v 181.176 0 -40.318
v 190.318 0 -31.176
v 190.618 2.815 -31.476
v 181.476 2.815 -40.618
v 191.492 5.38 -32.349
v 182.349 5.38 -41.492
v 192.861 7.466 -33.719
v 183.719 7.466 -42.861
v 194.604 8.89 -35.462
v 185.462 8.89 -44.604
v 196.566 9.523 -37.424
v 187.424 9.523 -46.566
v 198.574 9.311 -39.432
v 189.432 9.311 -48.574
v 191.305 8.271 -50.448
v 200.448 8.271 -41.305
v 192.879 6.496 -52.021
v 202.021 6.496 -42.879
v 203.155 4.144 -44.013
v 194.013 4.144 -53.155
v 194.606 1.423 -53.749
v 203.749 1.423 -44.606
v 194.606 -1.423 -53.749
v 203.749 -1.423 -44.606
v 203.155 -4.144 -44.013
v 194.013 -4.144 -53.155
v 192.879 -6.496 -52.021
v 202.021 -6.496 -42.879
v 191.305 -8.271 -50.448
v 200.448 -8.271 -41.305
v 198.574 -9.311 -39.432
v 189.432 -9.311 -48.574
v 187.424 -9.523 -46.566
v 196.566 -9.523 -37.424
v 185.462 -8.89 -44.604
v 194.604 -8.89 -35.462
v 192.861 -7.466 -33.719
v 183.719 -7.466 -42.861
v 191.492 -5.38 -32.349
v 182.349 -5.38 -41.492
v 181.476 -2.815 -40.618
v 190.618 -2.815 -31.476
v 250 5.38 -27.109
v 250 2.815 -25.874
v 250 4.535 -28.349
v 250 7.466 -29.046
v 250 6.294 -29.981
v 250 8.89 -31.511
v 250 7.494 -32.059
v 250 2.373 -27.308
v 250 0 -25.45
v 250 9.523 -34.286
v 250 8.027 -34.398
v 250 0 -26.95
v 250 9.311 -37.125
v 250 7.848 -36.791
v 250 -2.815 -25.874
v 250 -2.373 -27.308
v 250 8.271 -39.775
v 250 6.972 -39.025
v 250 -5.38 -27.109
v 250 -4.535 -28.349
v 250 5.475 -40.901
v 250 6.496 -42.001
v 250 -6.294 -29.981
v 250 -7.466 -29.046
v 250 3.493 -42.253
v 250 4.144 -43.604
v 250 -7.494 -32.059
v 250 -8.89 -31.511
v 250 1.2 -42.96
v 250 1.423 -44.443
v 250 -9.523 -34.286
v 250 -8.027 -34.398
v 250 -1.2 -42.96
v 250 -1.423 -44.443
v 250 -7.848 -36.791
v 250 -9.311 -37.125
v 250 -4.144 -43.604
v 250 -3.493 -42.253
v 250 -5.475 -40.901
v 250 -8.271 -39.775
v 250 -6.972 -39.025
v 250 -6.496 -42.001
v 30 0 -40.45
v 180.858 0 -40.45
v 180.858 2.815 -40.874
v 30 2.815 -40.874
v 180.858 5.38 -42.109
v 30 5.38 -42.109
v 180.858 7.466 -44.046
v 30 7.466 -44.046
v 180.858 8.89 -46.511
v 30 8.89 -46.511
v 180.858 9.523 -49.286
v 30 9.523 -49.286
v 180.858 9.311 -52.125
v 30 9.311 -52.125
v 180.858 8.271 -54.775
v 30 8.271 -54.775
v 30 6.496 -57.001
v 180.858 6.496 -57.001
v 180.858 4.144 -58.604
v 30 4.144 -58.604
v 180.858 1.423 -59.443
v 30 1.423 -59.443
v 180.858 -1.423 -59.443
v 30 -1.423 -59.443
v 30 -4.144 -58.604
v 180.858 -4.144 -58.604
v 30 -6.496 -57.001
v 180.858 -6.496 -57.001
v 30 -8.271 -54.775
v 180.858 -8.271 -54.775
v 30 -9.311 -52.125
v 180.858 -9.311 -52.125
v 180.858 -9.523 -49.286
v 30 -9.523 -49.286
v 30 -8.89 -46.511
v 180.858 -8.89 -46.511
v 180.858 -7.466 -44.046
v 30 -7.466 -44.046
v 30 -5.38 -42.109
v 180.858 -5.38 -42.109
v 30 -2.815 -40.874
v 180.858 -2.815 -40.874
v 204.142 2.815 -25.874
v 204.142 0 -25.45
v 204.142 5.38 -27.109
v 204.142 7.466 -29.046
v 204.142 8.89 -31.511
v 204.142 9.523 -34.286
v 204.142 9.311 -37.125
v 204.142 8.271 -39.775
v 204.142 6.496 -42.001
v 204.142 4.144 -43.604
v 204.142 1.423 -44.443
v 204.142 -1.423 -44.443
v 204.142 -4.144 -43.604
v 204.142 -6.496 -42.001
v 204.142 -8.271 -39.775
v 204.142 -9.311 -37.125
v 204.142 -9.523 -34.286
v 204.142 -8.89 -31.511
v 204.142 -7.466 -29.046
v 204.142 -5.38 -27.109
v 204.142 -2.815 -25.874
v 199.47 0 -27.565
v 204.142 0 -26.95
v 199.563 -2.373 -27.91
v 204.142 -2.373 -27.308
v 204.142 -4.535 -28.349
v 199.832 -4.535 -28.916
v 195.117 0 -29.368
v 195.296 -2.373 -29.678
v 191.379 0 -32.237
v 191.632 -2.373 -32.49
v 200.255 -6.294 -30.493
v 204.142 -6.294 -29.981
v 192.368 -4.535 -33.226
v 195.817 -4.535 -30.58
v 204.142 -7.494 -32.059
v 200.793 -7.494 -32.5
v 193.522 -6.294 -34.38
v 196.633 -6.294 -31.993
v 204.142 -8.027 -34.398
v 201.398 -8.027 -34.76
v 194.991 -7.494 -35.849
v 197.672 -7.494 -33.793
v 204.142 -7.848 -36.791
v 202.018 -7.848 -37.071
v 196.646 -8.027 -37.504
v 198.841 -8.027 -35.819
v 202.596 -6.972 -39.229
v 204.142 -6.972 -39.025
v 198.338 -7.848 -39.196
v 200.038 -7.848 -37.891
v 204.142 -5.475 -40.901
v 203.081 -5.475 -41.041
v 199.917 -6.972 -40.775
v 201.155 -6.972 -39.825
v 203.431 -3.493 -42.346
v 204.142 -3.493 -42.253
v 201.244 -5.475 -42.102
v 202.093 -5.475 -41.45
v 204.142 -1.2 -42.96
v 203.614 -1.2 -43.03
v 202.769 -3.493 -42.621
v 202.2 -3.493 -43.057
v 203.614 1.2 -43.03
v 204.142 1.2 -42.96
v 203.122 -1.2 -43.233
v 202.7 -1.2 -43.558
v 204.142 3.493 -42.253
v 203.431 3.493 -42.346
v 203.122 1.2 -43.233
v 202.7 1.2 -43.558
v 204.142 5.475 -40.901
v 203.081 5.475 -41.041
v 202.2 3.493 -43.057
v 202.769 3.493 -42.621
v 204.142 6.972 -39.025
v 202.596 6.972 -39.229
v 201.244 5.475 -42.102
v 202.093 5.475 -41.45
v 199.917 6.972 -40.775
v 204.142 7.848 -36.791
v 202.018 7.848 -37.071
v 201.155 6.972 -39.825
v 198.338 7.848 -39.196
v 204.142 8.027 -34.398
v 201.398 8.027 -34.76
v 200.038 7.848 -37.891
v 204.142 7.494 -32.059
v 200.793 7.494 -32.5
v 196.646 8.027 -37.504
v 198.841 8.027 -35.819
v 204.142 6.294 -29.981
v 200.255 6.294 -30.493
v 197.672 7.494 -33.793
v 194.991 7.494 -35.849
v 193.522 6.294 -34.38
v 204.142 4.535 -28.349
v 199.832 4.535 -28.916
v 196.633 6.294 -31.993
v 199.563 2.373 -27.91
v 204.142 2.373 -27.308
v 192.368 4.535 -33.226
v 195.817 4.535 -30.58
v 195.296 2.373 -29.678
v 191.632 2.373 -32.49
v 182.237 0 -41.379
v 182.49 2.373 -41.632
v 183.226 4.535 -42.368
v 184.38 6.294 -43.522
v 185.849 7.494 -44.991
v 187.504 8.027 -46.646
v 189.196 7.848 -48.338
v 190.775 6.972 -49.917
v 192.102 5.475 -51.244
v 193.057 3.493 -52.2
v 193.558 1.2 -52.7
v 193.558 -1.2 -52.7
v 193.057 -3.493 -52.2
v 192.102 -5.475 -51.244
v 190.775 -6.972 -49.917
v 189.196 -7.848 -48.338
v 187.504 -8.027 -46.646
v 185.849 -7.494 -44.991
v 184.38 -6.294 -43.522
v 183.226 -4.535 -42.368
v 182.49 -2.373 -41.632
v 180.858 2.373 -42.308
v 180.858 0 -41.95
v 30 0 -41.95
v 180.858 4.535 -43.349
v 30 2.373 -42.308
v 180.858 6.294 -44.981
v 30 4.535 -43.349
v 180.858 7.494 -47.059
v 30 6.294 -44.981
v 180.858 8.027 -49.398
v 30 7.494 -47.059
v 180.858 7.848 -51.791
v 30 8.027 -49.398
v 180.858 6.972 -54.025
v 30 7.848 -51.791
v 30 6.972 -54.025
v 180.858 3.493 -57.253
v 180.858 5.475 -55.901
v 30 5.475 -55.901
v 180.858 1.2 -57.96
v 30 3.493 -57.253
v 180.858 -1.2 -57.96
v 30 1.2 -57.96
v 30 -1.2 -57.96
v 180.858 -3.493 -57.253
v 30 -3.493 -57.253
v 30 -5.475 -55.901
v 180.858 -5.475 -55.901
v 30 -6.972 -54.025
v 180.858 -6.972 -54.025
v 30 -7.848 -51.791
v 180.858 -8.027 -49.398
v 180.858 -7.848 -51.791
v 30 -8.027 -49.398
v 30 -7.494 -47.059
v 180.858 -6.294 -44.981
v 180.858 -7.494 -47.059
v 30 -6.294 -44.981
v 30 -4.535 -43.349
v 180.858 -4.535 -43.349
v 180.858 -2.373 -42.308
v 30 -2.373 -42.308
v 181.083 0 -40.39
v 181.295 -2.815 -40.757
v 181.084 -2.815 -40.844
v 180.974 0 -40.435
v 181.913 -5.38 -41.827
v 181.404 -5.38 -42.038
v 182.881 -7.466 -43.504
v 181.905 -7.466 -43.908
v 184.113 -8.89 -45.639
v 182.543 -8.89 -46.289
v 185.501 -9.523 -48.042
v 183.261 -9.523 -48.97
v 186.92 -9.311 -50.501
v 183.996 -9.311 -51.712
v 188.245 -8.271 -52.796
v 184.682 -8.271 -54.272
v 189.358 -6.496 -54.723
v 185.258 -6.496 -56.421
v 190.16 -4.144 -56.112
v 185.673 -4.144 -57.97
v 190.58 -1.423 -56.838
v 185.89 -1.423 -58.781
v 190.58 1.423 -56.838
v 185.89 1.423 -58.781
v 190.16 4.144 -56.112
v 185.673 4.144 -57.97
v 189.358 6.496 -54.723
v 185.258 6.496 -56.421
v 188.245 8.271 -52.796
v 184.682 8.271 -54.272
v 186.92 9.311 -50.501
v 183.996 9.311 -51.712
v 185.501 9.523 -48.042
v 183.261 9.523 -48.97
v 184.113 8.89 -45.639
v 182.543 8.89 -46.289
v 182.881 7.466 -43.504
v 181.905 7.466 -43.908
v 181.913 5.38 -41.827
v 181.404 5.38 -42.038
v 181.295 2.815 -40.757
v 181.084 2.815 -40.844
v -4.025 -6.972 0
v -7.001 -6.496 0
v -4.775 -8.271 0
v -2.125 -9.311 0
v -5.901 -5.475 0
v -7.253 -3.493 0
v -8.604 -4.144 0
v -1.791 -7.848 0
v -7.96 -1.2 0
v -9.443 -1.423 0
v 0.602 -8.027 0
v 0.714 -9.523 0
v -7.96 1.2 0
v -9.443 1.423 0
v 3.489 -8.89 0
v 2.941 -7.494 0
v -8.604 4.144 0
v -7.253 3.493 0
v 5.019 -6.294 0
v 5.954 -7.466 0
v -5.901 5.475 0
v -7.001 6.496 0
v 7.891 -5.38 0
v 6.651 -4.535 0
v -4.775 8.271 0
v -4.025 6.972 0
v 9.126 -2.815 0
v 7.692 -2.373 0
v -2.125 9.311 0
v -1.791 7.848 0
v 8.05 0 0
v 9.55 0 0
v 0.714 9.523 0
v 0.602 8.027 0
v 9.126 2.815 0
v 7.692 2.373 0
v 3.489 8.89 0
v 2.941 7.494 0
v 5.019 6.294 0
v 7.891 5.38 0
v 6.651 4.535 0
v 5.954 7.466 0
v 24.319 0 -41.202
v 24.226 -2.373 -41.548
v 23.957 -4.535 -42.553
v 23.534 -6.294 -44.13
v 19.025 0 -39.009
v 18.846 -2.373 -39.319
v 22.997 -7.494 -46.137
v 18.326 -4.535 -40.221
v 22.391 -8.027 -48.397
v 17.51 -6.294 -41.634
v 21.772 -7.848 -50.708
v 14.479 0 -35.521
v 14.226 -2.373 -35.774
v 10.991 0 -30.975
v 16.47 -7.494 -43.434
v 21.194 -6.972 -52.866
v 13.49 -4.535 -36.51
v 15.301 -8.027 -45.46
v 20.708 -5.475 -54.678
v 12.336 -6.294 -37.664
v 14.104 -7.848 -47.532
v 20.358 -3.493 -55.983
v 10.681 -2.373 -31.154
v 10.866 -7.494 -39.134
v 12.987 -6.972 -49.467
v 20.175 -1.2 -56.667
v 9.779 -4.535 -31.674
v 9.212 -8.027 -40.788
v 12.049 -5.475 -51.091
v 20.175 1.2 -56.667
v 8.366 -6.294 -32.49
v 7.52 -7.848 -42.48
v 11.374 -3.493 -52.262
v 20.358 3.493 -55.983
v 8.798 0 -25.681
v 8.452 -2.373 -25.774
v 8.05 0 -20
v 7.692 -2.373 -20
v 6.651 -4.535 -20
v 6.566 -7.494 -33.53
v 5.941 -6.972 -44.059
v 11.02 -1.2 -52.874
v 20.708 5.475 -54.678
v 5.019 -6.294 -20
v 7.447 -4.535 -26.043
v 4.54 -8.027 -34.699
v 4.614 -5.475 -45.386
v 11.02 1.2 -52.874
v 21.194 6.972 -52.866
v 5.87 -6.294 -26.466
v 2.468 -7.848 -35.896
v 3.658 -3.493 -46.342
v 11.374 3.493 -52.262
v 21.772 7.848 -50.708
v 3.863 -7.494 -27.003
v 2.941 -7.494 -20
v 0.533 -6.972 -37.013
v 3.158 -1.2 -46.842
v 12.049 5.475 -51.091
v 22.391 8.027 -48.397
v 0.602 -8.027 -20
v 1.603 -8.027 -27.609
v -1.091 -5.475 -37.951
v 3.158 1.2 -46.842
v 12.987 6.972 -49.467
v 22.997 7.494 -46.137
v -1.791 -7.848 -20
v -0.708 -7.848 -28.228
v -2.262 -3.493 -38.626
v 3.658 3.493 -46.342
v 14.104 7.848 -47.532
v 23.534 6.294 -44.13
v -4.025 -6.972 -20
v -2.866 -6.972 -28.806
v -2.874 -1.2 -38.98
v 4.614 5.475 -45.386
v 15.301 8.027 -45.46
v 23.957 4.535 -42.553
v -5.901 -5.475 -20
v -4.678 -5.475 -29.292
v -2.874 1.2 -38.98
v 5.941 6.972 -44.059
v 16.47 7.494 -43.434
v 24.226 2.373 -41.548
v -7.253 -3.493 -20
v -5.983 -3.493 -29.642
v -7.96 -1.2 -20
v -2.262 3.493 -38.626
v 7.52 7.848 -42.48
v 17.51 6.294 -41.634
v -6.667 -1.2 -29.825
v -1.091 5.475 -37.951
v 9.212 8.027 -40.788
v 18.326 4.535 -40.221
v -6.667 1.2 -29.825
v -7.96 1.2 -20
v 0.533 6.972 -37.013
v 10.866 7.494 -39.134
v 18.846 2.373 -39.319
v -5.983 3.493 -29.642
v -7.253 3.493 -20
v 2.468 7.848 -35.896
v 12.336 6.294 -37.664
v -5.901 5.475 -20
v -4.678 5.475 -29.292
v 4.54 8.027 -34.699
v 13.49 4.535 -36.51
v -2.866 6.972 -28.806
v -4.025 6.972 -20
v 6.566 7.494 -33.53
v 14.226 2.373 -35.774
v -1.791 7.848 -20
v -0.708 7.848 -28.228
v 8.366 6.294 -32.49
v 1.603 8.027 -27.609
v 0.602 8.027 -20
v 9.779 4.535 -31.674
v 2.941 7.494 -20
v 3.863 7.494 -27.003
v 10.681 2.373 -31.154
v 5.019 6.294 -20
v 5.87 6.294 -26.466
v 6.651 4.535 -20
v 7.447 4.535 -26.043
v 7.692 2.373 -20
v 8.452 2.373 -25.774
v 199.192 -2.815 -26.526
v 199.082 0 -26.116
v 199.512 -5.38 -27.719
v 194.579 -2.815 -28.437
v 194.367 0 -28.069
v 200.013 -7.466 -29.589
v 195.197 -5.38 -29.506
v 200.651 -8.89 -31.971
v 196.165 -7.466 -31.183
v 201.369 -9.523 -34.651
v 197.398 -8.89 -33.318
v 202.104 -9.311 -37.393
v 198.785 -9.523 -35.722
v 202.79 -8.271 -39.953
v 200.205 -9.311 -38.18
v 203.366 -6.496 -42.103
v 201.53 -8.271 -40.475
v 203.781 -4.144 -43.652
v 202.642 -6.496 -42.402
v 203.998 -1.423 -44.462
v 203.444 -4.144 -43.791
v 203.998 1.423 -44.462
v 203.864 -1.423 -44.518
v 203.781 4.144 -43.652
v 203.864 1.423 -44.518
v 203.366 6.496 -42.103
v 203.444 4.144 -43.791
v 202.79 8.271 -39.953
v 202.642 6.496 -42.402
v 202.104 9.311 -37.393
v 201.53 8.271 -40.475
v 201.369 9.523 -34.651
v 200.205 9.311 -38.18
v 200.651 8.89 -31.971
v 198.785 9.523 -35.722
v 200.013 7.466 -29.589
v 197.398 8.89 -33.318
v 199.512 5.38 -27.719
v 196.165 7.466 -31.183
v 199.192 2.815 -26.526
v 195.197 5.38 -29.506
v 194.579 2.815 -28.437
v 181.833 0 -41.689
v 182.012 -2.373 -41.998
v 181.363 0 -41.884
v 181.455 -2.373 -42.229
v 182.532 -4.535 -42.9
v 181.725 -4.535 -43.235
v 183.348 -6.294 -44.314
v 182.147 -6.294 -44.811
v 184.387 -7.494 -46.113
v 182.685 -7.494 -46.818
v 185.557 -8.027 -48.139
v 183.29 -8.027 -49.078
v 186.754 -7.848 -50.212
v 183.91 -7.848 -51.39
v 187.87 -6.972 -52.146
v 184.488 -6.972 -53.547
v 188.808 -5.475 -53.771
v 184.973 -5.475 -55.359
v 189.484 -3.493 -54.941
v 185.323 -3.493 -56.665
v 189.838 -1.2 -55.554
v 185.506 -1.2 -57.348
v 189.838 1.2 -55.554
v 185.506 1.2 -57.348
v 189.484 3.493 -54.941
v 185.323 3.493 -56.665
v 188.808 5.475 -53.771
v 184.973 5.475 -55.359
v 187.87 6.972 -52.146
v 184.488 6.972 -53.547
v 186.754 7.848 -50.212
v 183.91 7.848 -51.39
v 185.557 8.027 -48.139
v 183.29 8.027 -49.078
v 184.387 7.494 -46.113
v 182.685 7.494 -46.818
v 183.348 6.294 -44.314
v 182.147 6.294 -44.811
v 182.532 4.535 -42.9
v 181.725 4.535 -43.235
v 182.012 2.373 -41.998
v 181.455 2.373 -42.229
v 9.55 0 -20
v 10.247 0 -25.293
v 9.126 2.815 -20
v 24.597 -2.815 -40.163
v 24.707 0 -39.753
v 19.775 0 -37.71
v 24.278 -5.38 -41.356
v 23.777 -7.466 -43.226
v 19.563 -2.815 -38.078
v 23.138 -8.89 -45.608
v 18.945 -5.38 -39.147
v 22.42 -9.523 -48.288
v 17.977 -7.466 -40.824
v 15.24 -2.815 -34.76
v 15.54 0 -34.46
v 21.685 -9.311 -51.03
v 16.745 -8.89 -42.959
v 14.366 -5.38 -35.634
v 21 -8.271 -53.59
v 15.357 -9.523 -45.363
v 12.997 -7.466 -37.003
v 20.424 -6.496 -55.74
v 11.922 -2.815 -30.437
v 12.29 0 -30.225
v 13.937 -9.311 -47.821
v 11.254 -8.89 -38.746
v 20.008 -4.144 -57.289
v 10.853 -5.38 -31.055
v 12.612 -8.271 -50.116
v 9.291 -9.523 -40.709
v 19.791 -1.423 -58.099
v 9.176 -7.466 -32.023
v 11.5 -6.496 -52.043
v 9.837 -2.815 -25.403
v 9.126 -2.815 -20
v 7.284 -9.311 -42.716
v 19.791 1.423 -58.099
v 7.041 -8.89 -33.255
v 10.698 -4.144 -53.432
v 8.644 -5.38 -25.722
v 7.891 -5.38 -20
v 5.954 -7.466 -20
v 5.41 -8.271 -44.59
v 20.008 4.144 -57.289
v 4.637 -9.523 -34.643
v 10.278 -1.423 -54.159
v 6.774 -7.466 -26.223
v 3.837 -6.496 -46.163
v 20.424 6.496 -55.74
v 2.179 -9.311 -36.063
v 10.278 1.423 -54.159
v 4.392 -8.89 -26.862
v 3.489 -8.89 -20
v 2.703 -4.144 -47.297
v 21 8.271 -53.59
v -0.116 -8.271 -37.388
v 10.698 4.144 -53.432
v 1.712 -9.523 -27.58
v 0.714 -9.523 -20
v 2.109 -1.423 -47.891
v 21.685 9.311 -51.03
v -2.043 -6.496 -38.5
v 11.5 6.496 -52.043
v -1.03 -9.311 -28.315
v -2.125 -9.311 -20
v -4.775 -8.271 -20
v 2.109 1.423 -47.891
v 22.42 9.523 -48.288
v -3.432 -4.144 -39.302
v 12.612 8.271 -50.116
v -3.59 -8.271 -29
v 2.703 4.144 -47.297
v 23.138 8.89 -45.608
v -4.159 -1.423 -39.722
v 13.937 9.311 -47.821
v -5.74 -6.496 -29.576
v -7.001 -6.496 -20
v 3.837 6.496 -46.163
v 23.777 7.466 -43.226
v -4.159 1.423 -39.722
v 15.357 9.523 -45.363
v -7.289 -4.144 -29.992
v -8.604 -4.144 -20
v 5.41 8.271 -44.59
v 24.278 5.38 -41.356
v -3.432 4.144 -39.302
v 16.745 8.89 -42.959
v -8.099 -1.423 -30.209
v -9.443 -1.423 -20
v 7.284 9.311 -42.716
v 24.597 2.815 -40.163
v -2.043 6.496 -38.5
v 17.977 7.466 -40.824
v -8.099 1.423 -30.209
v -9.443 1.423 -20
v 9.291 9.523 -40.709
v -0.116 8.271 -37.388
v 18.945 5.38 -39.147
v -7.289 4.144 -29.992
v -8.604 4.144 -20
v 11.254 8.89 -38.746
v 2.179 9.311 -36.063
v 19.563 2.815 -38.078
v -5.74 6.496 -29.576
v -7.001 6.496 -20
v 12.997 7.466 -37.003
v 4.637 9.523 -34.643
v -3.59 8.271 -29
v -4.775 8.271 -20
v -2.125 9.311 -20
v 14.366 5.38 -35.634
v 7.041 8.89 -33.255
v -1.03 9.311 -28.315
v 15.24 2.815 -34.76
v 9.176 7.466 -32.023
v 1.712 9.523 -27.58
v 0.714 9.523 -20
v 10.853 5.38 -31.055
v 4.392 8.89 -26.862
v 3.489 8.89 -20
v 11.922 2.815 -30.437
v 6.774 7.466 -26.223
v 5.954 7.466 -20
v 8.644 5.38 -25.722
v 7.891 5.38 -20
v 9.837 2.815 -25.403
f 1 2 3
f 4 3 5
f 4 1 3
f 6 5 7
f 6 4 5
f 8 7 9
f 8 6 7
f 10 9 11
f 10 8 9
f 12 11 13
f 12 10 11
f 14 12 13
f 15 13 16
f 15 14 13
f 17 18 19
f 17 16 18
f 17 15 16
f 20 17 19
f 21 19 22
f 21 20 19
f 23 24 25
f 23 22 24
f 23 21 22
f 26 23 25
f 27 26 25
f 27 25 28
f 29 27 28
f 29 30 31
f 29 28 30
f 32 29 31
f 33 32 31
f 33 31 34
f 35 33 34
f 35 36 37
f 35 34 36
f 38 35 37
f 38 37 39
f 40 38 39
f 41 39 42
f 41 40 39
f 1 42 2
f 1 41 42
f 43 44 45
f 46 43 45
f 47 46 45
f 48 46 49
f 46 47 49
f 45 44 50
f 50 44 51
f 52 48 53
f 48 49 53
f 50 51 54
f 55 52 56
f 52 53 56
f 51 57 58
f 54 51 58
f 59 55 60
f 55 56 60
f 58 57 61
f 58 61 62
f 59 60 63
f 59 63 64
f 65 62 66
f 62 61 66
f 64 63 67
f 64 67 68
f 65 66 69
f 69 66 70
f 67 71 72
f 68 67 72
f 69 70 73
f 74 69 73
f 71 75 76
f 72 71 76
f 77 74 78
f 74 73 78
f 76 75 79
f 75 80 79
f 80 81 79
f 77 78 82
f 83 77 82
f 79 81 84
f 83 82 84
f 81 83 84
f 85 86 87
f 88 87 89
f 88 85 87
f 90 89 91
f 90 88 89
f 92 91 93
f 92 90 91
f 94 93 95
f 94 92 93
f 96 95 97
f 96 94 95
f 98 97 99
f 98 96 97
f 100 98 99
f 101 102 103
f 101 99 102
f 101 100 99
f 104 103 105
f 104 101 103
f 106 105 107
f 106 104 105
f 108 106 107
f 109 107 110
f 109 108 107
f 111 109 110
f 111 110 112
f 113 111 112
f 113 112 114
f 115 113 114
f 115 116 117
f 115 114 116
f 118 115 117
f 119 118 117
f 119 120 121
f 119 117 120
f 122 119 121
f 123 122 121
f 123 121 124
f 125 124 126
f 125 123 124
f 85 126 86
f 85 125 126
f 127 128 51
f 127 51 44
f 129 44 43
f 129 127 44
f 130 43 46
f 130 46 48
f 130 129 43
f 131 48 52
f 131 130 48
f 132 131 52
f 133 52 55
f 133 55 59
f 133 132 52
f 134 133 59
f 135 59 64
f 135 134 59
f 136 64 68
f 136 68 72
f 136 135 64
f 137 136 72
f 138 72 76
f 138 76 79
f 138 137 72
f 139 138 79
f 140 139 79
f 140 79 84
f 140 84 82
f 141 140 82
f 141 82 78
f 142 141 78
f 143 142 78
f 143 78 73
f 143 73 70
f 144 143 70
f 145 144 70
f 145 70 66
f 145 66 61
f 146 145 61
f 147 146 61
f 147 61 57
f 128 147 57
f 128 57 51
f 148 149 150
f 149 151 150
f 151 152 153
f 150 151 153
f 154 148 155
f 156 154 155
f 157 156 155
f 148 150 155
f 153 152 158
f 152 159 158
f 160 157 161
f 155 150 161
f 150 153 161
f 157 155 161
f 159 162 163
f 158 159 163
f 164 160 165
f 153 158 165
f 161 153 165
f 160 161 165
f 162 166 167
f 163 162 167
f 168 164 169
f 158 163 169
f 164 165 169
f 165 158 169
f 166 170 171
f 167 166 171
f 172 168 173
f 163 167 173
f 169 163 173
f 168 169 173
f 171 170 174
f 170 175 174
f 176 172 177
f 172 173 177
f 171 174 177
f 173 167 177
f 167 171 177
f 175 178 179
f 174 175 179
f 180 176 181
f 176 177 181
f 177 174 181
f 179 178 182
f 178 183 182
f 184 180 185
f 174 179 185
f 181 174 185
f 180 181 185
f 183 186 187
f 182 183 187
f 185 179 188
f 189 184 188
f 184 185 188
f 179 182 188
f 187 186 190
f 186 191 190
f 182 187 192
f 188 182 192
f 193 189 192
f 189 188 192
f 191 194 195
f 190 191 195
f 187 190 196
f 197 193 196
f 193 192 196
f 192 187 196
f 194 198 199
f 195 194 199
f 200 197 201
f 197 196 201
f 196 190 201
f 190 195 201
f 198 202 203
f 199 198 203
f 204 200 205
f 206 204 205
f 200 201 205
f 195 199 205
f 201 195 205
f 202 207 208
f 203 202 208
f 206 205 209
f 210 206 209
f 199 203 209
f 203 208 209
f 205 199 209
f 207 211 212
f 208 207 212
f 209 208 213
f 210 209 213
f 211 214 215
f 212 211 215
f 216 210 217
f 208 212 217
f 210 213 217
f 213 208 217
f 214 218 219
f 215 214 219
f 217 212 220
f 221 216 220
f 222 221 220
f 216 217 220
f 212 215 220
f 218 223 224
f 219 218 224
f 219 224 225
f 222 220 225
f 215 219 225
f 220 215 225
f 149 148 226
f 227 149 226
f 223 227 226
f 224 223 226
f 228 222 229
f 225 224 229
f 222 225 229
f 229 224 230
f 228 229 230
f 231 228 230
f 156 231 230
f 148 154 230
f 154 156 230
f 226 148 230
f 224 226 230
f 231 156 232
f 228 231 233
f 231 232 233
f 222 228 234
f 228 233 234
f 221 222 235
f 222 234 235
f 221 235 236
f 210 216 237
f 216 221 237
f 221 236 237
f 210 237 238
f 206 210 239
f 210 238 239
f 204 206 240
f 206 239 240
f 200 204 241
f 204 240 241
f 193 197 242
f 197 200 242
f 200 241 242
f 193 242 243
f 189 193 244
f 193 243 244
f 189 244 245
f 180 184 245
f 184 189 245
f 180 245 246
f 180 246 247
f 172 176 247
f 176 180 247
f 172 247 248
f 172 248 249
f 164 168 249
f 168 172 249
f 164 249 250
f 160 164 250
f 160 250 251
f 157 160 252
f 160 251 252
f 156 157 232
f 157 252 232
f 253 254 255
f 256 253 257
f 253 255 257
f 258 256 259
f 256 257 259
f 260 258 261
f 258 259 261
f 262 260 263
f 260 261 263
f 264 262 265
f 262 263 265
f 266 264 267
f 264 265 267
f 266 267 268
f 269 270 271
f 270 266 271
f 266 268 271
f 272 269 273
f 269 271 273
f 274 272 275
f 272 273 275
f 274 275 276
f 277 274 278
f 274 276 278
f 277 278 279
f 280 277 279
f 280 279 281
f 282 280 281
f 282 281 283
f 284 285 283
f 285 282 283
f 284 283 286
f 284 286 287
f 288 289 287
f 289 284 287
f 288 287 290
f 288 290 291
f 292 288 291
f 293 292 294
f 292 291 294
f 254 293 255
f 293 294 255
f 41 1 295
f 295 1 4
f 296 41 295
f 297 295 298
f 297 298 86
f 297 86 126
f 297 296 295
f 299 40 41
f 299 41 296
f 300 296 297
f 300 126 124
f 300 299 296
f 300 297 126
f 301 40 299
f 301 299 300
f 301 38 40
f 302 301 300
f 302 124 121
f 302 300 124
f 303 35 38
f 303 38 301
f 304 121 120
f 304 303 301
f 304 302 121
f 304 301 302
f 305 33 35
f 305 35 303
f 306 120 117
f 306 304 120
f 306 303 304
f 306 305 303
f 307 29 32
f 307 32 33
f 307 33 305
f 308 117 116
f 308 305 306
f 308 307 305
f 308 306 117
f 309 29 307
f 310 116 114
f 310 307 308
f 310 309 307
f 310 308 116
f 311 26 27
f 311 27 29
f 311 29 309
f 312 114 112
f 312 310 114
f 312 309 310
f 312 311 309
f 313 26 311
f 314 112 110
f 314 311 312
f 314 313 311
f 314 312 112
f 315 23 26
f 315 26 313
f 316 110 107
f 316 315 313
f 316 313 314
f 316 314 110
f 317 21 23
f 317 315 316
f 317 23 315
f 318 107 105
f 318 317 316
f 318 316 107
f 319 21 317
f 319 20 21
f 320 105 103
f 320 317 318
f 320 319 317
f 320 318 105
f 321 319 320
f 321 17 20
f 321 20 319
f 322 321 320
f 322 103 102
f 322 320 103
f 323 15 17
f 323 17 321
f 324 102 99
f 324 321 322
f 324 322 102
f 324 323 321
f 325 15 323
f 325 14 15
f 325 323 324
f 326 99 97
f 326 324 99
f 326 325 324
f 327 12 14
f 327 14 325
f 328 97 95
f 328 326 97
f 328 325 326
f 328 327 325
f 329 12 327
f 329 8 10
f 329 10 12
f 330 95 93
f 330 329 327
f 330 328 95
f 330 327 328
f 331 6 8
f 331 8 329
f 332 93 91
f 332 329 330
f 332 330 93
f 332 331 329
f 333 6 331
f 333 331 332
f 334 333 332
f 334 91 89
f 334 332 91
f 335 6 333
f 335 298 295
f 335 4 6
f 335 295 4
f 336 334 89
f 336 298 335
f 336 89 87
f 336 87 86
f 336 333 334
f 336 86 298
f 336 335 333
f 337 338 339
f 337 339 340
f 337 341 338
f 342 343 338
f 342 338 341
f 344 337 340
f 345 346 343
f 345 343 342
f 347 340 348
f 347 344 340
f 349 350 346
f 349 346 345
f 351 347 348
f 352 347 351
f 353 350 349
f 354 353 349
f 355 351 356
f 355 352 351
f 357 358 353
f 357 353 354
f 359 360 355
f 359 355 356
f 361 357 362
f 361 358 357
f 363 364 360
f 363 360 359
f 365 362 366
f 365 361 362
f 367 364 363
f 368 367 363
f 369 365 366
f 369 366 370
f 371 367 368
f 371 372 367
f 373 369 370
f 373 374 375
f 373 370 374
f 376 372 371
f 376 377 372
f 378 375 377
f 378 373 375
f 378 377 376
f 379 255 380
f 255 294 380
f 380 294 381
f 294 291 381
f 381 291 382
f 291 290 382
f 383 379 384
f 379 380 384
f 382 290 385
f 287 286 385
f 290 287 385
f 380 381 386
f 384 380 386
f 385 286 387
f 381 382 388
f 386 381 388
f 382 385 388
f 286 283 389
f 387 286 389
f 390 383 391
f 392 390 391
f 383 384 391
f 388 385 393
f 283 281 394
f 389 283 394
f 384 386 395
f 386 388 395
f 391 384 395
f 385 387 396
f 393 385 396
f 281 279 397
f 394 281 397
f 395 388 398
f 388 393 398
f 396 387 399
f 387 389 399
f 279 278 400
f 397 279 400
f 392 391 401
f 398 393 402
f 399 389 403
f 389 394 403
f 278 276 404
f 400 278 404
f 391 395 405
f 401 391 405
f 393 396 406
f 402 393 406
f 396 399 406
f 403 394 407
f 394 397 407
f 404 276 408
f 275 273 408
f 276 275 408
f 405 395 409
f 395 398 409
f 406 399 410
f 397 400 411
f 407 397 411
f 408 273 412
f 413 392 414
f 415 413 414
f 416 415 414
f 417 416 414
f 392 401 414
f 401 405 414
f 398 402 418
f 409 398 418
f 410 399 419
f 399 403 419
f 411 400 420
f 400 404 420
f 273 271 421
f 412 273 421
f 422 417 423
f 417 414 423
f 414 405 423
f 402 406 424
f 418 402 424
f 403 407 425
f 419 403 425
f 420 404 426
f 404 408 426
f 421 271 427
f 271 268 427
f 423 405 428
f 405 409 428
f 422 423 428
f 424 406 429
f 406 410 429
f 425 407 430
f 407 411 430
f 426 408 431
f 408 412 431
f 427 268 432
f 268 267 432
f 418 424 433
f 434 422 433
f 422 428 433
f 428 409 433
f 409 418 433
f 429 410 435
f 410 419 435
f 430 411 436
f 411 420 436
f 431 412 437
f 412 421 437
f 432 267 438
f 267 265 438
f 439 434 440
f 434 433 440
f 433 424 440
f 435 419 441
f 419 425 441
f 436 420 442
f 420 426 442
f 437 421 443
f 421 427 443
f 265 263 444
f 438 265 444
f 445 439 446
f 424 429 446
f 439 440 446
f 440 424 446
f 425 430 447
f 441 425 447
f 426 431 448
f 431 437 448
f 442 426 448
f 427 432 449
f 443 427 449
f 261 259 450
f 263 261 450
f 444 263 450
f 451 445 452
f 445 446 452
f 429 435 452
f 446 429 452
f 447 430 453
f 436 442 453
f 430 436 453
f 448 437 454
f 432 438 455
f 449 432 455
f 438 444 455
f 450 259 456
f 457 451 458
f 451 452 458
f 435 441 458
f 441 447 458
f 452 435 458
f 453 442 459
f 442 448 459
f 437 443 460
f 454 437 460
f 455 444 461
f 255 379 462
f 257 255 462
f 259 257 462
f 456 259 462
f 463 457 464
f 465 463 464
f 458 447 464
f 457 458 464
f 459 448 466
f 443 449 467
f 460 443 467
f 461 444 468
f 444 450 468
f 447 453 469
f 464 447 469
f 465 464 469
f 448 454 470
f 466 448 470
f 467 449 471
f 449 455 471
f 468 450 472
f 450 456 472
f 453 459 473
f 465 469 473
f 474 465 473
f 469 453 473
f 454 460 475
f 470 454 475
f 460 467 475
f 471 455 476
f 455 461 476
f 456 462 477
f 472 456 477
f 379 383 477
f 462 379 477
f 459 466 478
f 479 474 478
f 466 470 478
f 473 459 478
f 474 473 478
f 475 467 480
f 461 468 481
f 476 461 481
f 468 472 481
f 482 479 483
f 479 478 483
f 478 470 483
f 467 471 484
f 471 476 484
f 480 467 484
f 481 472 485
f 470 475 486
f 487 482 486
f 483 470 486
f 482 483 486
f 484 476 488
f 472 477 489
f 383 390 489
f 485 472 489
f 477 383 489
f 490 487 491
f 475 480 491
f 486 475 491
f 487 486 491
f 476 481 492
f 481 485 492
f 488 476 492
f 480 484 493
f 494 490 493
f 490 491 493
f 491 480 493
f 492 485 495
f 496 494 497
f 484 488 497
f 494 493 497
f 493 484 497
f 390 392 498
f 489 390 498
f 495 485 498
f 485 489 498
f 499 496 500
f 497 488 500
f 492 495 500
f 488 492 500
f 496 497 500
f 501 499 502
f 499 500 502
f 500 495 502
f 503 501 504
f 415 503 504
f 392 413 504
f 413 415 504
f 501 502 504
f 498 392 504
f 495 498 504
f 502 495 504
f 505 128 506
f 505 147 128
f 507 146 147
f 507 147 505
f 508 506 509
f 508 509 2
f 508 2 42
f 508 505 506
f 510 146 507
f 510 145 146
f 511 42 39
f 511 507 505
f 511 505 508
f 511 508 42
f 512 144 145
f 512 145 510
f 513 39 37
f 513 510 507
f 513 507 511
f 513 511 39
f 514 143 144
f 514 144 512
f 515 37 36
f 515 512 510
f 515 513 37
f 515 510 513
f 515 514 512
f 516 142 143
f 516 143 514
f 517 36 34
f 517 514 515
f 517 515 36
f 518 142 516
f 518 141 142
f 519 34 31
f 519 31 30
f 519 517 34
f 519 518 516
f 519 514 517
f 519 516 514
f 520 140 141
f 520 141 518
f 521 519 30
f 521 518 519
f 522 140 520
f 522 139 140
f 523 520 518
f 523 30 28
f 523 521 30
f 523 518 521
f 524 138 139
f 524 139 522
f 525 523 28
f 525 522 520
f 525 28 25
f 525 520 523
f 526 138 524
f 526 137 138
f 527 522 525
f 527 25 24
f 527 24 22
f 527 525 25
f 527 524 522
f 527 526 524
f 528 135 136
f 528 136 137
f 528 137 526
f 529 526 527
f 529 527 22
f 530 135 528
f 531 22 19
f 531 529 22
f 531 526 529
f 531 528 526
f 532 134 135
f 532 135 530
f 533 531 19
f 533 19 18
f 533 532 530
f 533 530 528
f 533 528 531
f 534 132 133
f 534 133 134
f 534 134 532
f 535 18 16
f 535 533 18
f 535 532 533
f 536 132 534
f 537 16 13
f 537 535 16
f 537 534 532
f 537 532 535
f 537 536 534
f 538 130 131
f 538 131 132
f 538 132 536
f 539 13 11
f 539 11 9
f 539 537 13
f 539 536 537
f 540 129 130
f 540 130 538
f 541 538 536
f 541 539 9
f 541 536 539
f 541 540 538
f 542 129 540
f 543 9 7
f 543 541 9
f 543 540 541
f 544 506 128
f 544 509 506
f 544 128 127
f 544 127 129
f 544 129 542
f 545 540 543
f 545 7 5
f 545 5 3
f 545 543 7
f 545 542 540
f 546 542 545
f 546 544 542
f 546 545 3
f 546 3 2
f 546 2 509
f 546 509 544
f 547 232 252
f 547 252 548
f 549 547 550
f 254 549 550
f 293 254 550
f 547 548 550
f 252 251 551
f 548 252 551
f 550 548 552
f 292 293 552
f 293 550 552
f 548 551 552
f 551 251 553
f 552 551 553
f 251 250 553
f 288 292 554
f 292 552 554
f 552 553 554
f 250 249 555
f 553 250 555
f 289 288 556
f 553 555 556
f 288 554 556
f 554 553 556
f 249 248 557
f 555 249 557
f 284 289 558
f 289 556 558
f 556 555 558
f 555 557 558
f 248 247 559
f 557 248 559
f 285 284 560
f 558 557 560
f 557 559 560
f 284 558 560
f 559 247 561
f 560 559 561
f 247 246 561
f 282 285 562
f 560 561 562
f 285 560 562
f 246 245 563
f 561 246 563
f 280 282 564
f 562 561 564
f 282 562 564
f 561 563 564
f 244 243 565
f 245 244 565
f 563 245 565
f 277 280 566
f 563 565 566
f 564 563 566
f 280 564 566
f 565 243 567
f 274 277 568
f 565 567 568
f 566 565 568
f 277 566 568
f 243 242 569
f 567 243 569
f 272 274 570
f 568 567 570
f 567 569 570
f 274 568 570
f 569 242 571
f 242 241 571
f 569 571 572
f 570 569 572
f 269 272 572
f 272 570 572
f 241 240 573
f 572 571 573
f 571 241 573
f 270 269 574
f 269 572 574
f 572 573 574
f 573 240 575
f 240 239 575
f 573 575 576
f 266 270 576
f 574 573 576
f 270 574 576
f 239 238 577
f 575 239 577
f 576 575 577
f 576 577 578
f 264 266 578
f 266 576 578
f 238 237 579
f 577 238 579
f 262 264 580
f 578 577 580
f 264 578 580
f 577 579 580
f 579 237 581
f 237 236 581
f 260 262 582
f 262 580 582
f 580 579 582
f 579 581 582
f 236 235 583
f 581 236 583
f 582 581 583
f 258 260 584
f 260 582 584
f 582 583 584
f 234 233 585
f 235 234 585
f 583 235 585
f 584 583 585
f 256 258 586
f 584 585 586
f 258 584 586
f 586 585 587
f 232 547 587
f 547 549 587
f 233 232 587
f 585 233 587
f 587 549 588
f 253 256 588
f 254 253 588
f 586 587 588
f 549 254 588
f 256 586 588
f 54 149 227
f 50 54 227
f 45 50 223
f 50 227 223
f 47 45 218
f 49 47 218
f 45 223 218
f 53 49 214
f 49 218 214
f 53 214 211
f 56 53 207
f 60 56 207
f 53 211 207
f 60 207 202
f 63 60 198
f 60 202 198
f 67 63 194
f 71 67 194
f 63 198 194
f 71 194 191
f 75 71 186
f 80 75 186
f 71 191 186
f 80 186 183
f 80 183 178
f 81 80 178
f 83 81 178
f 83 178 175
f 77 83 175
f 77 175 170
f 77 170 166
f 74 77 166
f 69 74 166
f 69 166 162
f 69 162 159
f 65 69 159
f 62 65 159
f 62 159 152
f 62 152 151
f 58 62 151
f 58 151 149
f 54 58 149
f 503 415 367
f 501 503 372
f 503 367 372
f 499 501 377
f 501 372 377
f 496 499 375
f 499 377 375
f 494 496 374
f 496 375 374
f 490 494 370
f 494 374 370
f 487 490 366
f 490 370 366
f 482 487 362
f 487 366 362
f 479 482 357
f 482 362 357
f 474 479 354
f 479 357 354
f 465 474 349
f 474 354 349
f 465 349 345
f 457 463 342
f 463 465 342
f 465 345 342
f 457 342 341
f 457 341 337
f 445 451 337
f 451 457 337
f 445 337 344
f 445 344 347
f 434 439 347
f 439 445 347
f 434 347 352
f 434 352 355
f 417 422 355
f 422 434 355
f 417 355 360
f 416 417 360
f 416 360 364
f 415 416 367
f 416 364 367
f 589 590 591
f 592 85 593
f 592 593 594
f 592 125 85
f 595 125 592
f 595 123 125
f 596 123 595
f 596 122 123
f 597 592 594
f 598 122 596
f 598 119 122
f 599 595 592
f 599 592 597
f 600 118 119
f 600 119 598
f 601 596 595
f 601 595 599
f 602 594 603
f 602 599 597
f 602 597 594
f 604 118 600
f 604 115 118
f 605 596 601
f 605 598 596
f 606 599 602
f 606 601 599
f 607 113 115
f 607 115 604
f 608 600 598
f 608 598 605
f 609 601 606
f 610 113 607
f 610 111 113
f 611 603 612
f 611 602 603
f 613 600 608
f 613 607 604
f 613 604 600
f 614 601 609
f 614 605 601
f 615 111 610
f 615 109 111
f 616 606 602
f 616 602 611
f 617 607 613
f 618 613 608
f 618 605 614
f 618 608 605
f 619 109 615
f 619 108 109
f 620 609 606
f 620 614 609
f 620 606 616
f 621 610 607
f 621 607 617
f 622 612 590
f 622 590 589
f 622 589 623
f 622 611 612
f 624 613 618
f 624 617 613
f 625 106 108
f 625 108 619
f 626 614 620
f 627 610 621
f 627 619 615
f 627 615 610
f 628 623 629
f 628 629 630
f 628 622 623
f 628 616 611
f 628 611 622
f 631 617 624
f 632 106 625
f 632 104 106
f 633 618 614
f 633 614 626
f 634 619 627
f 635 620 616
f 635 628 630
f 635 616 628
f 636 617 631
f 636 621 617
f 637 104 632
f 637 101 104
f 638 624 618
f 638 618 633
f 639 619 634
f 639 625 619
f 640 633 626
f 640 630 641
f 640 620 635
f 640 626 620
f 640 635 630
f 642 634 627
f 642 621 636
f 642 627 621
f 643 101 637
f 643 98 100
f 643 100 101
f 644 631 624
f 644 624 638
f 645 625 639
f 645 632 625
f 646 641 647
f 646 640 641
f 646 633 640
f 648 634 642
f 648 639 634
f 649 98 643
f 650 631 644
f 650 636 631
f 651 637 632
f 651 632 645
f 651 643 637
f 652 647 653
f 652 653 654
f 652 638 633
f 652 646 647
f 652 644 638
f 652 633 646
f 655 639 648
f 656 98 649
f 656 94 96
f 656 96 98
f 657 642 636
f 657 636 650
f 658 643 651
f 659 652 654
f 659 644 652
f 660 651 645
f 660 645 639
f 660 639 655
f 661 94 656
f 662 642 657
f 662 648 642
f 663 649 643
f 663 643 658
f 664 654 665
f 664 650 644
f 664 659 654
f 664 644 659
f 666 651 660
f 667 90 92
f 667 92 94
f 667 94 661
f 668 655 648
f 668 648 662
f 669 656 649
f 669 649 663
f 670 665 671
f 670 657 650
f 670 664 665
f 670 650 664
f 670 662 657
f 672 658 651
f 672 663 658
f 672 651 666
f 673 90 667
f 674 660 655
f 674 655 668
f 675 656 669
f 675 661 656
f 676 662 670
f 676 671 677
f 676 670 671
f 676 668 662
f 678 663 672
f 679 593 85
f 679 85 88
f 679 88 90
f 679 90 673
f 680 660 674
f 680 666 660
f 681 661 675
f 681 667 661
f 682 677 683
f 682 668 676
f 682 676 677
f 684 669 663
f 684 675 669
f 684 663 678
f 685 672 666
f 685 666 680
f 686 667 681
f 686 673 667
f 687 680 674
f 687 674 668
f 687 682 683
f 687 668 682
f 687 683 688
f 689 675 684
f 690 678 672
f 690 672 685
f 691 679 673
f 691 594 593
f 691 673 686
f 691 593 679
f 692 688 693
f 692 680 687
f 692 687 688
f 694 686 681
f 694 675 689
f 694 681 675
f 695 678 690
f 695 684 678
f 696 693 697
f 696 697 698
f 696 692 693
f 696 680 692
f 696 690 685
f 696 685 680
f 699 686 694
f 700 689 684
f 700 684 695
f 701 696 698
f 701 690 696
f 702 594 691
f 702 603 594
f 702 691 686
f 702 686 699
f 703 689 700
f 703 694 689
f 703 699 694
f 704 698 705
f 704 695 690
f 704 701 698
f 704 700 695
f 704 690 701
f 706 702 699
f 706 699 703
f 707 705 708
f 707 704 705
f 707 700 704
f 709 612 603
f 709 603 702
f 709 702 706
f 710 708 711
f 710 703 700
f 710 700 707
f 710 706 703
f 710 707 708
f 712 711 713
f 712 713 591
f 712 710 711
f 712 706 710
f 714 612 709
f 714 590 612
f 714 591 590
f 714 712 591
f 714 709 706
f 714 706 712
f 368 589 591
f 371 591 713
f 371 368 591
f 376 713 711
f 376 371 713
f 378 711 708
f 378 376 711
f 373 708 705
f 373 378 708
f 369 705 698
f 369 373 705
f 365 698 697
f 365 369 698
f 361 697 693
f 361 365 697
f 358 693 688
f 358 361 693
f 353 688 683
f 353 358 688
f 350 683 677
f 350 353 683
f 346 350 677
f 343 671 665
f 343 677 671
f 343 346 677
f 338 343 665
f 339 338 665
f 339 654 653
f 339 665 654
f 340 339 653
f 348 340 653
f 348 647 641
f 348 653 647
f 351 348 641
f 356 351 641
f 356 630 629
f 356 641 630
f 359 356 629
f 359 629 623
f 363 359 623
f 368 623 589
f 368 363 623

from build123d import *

# Parameters (mm, degrees)
SKETCH2_R   = 9.55
SKETCH2_R_2 = 8.05


with BuildPart() as part:
    # Sweep1: sweep along a path in Sketch1
    with BuildLine(Plane(origin=(0, 0, 0), x_dir=(1, 0, 0), z_dir=(0, 1, 0))) as sweep1_path:
        Line((250, 35), (204.142135624, 35))
        ThreePointArc((204.142135624, 35), (200.3153013, 35.761204675), (197.071067812, 37.928932188))
        Line((197.071067812, 37.928932188), (187.928932188, 47.071067812))
        ThreePointArc((187.928932188, 47.071067812), (184.6846987, 49.238795325), (180.857864376, 50))
        Line((180.857864376, 50), (30, 50))
        ThreePointArc((30, 50), (8.786796564, 41.213203436), (0, 20))
        Line((0, 20), (0, 0))
    # Sketch2 → Sweep1 (sweep)
    with BuildSketch(Plane.XY):
        Circle(SKETCH2_R)
        Circle(SKETCH2_R_2, mode=Mode.SUBTRACT)
    sweep(path=sweep1_path.line)


solid = part.part
